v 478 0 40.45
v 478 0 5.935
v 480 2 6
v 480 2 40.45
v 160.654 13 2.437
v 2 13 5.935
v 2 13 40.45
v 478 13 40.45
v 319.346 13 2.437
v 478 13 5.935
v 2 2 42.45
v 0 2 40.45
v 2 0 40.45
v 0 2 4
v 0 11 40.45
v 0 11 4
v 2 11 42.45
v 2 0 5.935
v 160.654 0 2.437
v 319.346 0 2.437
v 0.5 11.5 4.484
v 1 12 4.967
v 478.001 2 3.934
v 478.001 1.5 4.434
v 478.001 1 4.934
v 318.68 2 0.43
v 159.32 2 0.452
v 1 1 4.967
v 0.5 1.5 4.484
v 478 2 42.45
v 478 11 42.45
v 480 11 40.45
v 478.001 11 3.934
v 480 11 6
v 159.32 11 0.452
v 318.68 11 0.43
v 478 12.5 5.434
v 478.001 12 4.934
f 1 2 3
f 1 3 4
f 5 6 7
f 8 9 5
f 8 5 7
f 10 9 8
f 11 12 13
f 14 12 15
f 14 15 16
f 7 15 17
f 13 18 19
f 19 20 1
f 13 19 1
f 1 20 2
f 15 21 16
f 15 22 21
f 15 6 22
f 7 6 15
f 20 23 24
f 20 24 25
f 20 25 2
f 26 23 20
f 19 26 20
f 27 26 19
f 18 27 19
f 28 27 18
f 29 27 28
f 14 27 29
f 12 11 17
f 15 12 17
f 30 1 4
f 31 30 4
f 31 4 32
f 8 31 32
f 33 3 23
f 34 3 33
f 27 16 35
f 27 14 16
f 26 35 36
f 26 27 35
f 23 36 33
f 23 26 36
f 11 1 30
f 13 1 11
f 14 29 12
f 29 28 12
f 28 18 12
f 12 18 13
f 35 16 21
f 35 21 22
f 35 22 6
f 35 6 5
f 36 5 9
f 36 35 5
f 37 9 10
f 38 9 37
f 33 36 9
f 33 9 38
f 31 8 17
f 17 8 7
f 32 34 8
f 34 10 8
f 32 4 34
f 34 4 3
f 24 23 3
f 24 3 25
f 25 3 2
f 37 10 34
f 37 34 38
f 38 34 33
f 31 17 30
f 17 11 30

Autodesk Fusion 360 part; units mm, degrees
sketch "Sketch1" plane through (0, 0, 0) normal (0, 1, 0) x (1, 0, 0)
  line L0 (0, 0) -> (0, -42.45) construction
  line L1 (0, -42.45) -> (480, -42.45)
  line L2 (480, -42.45) -> (480, 0) construction
  line L3 (480, 0) -> (0, 0) construction
  line L4 (0, -42.45) -> (0, -4)
  line L5 (480, -42.45) -> (480, -4)
  arc A0 (480, -4) -> (0, -4) centre (240, -7202) ccw
  dimension "d1" = 480
  dimension "d2" = 4
  dimension "d3" = 42.45
extrude "Extrude1" add sketch "Sketch1" along normal blind 13
chamfer "Chamfer1" distance 2 angle 45 10 edges at (240, 0, 0) (0, 0, 23.225) (0, 6.5, 42.45) (480, 0, 23.225) (480, 6.5, 4) (0, 13, 23.225) (240, 0, 42.45) (480, 6.5, 42.45) (240, 13, 42.45) (480, 13, 23.225) 4 faces at (213.3289, 13, 28.4482) (480, 4.3333, 29.6333) (213.3289, 0, 28.4482) (160, 4.3333, 42.45)
equation "d3 = 1.75 in - 2 mm"
